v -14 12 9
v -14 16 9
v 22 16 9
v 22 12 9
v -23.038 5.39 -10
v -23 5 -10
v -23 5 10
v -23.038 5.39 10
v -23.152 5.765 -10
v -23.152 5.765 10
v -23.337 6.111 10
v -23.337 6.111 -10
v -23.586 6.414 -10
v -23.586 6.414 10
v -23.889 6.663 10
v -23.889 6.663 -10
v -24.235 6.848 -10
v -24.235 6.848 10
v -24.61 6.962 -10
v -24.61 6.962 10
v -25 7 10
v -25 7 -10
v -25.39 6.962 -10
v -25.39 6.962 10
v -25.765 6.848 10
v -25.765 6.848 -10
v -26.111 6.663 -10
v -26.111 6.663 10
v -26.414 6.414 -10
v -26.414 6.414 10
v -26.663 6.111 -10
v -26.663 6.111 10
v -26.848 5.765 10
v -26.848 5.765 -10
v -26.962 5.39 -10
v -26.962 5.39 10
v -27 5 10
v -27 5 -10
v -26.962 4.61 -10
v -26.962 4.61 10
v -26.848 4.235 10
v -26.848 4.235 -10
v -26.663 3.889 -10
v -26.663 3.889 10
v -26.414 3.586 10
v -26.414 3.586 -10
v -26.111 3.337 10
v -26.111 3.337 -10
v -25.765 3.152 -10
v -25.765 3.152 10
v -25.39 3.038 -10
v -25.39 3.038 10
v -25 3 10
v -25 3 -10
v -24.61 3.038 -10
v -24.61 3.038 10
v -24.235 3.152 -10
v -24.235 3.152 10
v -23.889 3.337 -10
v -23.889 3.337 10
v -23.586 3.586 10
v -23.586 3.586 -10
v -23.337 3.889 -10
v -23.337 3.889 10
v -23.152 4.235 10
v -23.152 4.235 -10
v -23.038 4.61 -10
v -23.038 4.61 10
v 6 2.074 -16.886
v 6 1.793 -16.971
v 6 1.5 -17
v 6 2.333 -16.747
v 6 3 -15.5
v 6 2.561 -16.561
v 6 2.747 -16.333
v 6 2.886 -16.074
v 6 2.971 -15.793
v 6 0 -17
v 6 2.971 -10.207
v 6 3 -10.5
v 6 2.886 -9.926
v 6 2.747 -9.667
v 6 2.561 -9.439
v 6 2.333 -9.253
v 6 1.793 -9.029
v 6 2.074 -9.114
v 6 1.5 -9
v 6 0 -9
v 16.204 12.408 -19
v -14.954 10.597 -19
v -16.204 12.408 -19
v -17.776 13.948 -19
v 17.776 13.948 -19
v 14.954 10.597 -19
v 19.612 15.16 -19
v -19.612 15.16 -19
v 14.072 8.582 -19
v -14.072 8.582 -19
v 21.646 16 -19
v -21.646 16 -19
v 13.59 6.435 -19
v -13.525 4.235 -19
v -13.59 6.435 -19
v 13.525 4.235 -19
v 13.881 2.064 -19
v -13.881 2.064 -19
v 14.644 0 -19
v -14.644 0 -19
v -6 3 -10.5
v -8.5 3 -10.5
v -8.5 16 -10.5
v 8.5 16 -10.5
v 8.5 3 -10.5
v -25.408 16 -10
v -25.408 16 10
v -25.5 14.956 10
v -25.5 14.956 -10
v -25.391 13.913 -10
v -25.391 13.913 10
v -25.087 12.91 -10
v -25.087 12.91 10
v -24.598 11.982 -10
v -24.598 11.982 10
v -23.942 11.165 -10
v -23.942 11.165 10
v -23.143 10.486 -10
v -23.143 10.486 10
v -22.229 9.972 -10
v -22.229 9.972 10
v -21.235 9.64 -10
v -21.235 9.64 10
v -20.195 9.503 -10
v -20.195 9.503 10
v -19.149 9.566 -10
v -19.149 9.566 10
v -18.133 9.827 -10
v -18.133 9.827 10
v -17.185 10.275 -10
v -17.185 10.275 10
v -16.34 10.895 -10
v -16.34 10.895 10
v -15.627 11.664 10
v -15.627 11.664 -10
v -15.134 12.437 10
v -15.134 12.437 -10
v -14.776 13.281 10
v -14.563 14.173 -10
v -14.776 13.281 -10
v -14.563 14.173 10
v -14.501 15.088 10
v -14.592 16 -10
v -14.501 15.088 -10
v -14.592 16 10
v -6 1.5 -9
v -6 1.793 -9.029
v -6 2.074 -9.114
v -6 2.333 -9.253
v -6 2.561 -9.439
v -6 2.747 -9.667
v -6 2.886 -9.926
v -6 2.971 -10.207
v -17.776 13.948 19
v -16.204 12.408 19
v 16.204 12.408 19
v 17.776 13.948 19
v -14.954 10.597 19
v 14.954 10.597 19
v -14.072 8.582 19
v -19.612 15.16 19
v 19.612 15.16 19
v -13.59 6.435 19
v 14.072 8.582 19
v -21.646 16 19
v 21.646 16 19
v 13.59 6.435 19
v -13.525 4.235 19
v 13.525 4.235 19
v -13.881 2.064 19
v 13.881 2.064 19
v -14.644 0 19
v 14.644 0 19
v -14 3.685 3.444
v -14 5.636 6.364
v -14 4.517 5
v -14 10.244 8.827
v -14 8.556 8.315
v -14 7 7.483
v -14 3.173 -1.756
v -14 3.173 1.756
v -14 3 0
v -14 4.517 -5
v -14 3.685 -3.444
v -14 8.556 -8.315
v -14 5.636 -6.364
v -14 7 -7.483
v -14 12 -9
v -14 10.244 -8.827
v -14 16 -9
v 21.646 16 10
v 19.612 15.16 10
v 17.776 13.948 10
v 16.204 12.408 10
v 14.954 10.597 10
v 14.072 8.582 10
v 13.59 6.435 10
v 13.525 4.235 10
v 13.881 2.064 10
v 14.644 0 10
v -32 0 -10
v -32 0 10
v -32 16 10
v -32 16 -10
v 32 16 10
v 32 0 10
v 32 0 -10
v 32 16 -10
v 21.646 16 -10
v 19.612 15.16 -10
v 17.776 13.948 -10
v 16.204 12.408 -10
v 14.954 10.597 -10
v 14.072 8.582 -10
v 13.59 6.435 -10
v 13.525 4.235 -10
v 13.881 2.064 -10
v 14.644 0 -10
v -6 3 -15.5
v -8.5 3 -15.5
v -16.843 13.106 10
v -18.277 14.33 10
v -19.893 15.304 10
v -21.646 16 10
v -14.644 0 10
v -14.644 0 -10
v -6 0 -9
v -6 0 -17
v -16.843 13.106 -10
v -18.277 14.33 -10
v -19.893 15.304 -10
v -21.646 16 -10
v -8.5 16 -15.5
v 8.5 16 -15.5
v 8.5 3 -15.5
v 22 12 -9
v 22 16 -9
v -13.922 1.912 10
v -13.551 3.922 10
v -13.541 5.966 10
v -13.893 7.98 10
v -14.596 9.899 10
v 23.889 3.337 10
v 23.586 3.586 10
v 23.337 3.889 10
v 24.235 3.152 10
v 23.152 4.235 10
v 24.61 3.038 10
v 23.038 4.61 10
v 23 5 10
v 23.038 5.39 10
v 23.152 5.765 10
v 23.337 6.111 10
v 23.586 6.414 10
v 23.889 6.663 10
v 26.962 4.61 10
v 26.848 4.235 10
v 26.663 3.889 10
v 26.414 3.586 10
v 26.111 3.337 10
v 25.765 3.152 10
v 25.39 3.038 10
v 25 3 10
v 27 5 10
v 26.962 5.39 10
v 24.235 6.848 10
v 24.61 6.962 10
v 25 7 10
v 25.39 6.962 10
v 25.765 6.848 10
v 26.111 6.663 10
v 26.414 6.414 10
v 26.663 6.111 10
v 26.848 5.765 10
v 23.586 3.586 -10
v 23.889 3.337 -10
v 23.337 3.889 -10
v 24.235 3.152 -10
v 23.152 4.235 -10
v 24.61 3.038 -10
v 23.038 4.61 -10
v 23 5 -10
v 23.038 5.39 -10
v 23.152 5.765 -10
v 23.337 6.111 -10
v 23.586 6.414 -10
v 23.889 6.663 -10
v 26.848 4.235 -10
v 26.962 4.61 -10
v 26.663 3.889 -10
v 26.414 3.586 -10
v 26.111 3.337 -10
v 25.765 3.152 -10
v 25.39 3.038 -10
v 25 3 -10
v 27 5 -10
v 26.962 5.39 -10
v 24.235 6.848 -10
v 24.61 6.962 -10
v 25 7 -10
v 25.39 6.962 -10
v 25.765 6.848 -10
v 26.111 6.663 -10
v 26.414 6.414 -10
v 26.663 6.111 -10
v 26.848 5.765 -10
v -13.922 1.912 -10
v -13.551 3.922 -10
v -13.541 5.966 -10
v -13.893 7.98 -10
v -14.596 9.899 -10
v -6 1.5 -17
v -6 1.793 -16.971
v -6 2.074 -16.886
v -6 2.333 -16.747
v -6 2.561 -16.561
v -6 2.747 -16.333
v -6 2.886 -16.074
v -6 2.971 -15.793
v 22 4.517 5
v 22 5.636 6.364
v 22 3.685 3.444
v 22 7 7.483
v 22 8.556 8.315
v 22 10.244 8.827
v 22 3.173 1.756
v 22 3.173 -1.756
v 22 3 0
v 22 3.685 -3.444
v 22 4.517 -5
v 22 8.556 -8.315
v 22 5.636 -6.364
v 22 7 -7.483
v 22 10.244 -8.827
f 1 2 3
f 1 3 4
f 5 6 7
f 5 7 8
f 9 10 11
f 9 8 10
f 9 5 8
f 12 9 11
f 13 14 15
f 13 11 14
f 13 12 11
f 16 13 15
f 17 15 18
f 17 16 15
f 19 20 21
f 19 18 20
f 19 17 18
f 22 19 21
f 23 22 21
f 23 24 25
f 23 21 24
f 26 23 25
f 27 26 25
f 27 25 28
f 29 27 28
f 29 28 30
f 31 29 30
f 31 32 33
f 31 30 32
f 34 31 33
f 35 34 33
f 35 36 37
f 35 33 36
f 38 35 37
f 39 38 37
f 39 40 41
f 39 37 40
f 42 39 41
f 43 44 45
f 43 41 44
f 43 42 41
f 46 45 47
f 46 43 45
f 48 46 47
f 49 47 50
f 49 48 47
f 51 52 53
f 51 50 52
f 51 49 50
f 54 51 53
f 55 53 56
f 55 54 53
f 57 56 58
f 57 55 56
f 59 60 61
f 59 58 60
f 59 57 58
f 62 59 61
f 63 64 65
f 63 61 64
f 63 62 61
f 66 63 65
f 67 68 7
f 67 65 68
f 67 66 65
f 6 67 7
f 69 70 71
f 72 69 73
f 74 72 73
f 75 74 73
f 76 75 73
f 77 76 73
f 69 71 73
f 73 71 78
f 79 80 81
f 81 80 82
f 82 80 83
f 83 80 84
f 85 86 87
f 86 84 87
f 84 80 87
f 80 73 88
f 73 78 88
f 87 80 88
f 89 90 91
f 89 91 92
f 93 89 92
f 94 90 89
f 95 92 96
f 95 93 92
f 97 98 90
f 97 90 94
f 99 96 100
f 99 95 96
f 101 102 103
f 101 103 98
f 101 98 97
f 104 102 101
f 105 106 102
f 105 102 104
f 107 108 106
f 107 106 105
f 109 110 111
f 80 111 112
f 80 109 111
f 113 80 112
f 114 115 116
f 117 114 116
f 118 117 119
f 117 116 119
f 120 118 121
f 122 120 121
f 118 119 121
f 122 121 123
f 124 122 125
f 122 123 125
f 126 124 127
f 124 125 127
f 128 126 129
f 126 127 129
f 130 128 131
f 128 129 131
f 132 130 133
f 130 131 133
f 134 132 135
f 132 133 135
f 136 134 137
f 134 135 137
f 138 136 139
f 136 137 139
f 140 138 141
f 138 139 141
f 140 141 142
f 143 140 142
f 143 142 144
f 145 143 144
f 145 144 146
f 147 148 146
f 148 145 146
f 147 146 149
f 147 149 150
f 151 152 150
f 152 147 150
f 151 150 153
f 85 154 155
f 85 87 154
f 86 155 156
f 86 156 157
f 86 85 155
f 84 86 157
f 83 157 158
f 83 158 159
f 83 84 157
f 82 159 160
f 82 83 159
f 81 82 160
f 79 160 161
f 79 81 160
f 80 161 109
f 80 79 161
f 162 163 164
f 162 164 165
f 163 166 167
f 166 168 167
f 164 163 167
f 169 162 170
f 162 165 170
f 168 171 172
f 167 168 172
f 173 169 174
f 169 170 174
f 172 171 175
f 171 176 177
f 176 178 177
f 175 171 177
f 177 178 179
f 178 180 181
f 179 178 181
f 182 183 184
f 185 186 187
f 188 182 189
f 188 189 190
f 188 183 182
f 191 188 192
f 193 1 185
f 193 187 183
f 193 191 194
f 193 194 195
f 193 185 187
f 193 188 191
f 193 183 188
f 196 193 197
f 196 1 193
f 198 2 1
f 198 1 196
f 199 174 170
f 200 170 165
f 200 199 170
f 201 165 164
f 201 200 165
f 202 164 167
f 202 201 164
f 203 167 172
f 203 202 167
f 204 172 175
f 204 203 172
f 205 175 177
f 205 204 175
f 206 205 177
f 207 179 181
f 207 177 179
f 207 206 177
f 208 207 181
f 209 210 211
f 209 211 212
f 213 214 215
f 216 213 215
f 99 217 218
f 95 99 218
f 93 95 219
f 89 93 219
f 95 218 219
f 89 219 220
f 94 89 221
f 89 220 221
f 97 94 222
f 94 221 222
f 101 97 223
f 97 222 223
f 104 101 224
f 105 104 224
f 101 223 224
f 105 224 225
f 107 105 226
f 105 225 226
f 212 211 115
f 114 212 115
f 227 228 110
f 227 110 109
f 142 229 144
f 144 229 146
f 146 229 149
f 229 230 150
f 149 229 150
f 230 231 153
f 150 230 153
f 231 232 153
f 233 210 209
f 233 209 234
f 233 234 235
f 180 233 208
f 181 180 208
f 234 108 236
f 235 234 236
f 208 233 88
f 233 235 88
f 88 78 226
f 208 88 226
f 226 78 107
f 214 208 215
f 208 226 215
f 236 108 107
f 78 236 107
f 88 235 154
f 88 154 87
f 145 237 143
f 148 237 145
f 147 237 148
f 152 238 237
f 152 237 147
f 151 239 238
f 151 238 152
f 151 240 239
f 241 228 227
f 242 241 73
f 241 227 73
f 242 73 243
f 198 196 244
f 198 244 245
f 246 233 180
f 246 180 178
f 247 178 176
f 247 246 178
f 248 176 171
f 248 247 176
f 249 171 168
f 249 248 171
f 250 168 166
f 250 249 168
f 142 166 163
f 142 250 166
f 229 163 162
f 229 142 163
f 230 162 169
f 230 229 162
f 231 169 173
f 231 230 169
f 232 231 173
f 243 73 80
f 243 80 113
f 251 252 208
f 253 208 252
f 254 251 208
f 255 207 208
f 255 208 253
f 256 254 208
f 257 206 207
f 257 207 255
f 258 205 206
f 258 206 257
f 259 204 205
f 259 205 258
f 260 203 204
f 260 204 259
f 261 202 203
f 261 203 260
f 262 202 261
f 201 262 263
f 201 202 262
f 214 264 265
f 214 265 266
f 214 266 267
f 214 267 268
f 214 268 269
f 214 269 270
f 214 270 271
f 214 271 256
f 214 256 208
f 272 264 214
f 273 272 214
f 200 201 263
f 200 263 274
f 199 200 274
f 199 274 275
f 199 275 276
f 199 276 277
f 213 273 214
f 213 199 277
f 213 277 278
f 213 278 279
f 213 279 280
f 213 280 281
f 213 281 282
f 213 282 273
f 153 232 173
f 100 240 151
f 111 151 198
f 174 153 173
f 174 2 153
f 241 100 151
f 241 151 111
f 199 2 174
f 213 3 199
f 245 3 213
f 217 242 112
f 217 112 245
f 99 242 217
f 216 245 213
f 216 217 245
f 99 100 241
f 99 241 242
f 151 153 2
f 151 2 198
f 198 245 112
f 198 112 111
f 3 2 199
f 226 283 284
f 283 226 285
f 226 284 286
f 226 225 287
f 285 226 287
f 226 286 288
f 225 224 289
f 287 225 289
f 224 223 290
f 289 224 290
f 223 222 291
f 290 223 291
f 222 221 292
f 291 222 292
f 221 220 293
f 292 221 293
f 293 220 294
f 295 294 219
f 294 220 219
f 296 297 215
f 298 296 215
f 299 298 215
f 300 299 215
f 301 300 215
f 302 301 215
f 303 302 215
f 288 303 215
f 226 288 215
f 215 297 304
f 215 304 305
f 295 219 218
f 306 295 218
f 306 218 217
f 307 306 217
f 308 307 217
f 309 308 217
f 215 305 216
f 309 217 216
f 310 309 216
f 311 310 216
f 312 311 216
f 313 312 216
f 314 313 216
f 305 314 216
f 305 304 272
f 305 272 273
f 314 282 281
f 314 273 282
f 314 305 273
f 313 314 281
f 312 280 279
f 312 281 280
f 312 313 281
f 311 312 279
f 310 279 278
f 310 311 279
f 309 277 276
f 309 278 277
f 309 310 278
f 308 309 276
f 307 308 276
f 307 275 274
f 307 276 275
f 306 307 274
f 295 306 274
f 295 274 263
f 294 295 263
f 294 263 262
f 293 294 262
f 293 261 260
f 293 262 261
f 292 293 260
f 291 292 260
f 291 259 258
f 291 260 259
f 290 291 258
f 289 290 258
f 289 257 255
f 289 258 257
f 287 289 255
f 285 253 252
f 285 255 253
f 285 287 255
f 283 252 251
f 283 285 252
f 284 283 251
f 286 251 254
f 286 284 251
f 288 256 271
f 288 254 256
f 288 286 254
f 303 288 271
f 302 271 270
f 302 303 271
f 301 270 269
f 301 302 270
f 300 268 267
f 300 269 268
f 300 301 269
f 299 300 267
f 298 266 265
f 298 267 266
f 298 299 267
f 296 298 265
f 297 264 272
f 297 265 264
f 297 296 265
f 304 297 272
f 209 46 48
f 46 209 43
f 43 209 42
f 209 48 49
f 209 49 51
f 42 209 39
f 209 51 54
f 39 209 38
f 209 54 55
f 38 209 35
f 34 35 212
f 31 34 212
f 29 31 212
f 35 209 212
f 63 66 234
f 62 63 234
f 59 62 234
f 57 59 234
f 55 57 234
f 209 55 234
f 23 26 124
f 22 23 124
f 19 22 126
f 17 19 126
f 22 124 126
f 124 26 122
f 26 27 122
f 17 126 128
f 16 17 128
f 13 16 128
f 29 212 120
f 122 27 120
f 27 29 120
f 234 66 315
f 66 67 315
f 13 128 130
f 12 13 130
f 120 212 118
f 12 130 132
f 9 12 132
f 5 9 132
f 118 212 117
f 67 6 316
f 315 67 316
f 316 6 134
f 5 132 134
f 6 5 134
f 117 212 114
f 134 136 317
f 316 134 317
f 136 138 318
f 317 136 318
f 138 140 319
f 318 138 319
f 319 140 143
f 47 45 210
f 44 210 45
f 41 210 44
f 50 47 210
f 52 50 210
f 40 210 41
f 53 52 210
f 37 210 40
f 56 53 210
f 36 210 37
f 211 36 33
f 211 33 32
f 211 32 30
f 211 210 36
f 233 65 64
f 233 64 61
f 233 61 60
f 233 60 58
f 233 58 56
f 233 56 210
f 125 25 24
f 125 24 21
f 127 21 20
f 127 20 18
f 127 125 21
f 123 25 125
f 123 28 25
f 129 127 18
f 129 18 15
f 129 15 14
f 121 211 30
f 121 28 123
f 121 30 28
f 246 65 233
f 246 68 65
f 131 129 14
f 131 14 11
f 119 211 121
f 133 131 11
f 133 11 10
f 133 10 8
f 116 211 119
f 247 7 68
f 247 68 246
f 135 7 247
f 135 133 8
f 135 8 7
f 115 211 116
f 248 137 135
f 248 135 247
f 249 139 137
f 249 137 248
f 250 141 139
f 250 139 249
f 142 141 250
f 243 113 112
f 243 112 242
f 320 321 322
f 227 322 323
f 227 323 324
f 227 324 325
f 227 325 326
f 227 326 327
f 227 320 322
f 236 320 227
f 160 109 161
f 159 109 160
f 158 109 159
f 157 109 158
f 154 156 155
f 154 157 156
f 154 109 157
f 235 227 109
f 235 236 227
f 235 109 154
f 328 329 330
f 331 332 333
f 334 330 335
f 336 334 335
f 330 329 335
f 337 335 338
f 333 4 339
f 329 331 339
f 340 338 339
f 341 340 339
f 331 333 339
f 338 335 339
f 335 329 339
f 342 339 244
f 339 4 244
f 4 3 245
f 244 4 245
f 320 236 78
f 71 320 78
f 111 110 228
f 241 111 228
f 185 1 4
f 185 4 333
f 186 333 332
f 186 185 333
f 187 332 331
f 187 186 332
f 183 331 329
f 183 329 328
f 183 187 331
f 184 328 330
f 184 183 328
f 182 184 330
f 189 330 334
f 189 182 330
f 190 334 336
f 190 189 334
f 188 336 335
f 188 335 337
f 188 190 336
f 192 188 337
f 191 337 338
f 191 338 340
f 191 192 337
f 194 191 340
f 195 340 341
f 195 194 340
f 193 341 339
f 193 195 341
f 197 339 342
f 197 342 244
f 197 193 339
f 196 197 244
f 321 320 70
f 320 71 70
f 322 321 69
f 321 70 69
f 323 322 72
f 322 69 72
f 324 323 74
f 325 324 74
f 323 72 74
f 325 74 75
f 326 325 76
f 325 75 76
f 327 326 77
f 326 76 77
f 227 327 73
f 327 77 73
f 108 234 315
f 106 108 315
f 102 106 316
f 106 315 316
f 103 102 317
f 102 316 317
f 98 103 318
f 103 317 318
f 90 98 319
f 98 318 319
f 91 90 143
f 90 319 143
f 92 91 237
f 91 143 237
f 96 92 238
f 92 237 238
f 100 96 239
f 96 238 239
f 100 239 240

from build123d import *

# Parameters (mm, degrees)
SKETCH1_W               = 64
SKETCH1_H               = 38
BOSS_EXTRUDE1_DEPTH     = 16
CUT_EXTRUDE2_START      = 10
SKETCH3_R               = 11.5
CUT_EXTRUDE2_DEPTH      = 10
CUT_EXTRUDE3_DEPTH      = 41.509258201
CUT_EXTRUDE3_DEPTH_BACK = 41.509258201
SKETCH5_R               = 2
BATTERY_DEPTH           = 22
BATTERY_DEPTH_BACK      = 14
SKETCH4_R               = 9
CUT_EXTRUDE4_REACH      = 45.509
CUT_EXTRUDE4_START      = 3
SKETCH6_W               = 17
SKETCH6_H               = 5
SKETCH7_W               = 12
SKETCH7_H               = 8
CUT_EXTRUDE5_DEPTH      = 3
FILLET1_R               = 1.5
SKETCH8_R               = 5.5
CUT_EXTRUDE6_DEPTH      = 10


with BuildPart() as part:
    # Sketch1 → Boss-Extrude1 (new body)
    with BuildSketch(Plane(origin=(0, 0, 0), x_dir=(1, 0, 0), z_dir=(0, 1, 0))):
        Rectangle(SKETCH1_W, SKETCH1_H)
    extrude(amount=BOSS_EXTRUDE1_DEPTH)

    # Sketch3 → Cut-Extrude2 (cut)
    with BuildSketch(Plane.XY.offset(CUT_EXTRUDE2_START)):
        with BuildLine():
            Line((36.5, -6.5), (36.5, 5))
            ThreePointArc((36.5, 5), (33.131727984, -3.131727984), (25, -6.5))
            Line((25, -6.5), (36.5, -6.5))
        make_face()
        with Locations((25, 5)):
            Circle(SKETCH3_R)
        with BuildLine():
            Line((36.5, 16.5), (25, 16.5))
            ThreePointArc((25, 16.5), (33.131727984, 13.131727984), (36.5, 5))
            Line((36.5, 5), (36.5, 16.5))
        make_face()
        with Locations((-25, 5)):
            Circle(SKETCH3_R)
        with BuildLine():
            Line((-36.5, -6.5), (-25, -6.5))
            ThreePointArc((-25, -6.5), (-33.131727957, -3.13172801), (-36.5, 4.999999925))
            Line((-36.5, 4.999999925), (-36.5, -6.5))
        make_face()
        with BuildLine():
            Line((-36.5, 16.5), (-36.5, 4.999999925))
            ThreePointArc((-36.5, 4.999999925), (-33.13172801, 13.131727957), (-25, 16.5))
            Line((-25, 16.5), (-36.5, 16.5))
        make_face()
    cut_extrude2 = extrude(amount=CUT_EXTRUDE2_DEPTH, mode=Mode.SUBTRACT)

    # Mirror1: Cut-Extrude2 across plane
    add(cut_extrude2.mirror(Plane.XY), mode=Mode.SUBTRACT)

    # Sketch5 → Cut-Extrude3 (cut, two sides: drawn at the far end of the back side and taken through both)
    with BuildSketch(Plane.XY.offset(-CUT_EXTRUDE3_DEPTH_BACK)):
        with Locations((25, 5)):
            Circle(SKETCH5_R)
        with Locations((-25, 5)):
            Circle(SKETCH5_R)
    extrude(amount=CUT_EXTRUDE3_DEPTH + CUT_EXTRUDE3_DEPTH_BACK, mode=Mode.SUBTRACT)


with BuildPart() as body_2:
    # Sketch4 → Battery (new, two sides: drawn at the far end of the back side and taken through both)
    with BuildSketch(Plane(origin=(0, 0, 0), x_dir=(0, 0, -1), z_dir=(1, 0, 0)).offset(-BATTERY_DEPTH_BACK)):
        with Locations((0, 12)):
            Circle(SKETCH4_R)
        with BuildLine():
            Line((-9, 23.052760149), (-9, 12))
            ThreePointArc((-9, 12), (0, 21), (9, 12))
            Line((9, 12), (9, 23.052760149))
            Line((9, 23.052760149), (-9, 23.052760149))
        make_face()
    extrude(amount=BATTERY_DEPTH + BATTERY_DEPTH_BACK)


with BuildPart() as part_1:
    add(part.part)

    # Combine1: cut body 2
    add(body_2.part, mode=Mode.SUBTRACT)

    # Sketch6 → Cut-Extrude4 (cut, up to next)
    with BuildSketch(Plane(origin=(0, 0, 0), x_dir=(1, 0, 0), z_dir=(0, 1, 0)).offset(CUT_EXTRUDE4_START), mode=Mode.PRIVATE) as cut_extrude4_sk1:
        with Locations((0, 13)):
            Rectangle(SKETCH6_W, SKETCH6_H)
    cut_extrude4_tool1 = extrude(cut_extrude4_sk1.sketch, amount=CUT_EXTRUDE4_REACH, mode=Mode.PRIVATE) & part_1.part
    add(cut_extrude4_tool1.solids().sort_by_distance((0, 3, -13))[0], mode=Mode.SUBTRACT)

    # Sketch7 → Cut-Extrude5 (cut)
    with BuildSketch(Plane.XZ):
        with Locations((0, -13)):
            Rectangle(SKETCH7_W, SKETCH7_H)
    extrude(amount=-CUT_EXTRUDE5_DEPTH, mode=Mode.SUBTRACT)

    # Fillet1
    fillet1_edges = [part_1.edges().sort_by_distance(p)[0] for p in [
        (0, 3, -17),
        (0, 3, -9),
    ]]
    fillet(fillet1_edges, radius=FILLET1_R - 0.0001)  # a hair under: the kernel refuses the full size

    # Sketch8 → Cut-Extrude6 (cut, symmetric)
    with BuildSketch(Plane.XY):
        with Locations((-20, 15)):
            Circle(SKETCH8_R)
    extrude(amount=CUT_EXTRUDE6_DEPTH, both=True, mode=Mode.SUBTRACT)


solid = part_1.part
